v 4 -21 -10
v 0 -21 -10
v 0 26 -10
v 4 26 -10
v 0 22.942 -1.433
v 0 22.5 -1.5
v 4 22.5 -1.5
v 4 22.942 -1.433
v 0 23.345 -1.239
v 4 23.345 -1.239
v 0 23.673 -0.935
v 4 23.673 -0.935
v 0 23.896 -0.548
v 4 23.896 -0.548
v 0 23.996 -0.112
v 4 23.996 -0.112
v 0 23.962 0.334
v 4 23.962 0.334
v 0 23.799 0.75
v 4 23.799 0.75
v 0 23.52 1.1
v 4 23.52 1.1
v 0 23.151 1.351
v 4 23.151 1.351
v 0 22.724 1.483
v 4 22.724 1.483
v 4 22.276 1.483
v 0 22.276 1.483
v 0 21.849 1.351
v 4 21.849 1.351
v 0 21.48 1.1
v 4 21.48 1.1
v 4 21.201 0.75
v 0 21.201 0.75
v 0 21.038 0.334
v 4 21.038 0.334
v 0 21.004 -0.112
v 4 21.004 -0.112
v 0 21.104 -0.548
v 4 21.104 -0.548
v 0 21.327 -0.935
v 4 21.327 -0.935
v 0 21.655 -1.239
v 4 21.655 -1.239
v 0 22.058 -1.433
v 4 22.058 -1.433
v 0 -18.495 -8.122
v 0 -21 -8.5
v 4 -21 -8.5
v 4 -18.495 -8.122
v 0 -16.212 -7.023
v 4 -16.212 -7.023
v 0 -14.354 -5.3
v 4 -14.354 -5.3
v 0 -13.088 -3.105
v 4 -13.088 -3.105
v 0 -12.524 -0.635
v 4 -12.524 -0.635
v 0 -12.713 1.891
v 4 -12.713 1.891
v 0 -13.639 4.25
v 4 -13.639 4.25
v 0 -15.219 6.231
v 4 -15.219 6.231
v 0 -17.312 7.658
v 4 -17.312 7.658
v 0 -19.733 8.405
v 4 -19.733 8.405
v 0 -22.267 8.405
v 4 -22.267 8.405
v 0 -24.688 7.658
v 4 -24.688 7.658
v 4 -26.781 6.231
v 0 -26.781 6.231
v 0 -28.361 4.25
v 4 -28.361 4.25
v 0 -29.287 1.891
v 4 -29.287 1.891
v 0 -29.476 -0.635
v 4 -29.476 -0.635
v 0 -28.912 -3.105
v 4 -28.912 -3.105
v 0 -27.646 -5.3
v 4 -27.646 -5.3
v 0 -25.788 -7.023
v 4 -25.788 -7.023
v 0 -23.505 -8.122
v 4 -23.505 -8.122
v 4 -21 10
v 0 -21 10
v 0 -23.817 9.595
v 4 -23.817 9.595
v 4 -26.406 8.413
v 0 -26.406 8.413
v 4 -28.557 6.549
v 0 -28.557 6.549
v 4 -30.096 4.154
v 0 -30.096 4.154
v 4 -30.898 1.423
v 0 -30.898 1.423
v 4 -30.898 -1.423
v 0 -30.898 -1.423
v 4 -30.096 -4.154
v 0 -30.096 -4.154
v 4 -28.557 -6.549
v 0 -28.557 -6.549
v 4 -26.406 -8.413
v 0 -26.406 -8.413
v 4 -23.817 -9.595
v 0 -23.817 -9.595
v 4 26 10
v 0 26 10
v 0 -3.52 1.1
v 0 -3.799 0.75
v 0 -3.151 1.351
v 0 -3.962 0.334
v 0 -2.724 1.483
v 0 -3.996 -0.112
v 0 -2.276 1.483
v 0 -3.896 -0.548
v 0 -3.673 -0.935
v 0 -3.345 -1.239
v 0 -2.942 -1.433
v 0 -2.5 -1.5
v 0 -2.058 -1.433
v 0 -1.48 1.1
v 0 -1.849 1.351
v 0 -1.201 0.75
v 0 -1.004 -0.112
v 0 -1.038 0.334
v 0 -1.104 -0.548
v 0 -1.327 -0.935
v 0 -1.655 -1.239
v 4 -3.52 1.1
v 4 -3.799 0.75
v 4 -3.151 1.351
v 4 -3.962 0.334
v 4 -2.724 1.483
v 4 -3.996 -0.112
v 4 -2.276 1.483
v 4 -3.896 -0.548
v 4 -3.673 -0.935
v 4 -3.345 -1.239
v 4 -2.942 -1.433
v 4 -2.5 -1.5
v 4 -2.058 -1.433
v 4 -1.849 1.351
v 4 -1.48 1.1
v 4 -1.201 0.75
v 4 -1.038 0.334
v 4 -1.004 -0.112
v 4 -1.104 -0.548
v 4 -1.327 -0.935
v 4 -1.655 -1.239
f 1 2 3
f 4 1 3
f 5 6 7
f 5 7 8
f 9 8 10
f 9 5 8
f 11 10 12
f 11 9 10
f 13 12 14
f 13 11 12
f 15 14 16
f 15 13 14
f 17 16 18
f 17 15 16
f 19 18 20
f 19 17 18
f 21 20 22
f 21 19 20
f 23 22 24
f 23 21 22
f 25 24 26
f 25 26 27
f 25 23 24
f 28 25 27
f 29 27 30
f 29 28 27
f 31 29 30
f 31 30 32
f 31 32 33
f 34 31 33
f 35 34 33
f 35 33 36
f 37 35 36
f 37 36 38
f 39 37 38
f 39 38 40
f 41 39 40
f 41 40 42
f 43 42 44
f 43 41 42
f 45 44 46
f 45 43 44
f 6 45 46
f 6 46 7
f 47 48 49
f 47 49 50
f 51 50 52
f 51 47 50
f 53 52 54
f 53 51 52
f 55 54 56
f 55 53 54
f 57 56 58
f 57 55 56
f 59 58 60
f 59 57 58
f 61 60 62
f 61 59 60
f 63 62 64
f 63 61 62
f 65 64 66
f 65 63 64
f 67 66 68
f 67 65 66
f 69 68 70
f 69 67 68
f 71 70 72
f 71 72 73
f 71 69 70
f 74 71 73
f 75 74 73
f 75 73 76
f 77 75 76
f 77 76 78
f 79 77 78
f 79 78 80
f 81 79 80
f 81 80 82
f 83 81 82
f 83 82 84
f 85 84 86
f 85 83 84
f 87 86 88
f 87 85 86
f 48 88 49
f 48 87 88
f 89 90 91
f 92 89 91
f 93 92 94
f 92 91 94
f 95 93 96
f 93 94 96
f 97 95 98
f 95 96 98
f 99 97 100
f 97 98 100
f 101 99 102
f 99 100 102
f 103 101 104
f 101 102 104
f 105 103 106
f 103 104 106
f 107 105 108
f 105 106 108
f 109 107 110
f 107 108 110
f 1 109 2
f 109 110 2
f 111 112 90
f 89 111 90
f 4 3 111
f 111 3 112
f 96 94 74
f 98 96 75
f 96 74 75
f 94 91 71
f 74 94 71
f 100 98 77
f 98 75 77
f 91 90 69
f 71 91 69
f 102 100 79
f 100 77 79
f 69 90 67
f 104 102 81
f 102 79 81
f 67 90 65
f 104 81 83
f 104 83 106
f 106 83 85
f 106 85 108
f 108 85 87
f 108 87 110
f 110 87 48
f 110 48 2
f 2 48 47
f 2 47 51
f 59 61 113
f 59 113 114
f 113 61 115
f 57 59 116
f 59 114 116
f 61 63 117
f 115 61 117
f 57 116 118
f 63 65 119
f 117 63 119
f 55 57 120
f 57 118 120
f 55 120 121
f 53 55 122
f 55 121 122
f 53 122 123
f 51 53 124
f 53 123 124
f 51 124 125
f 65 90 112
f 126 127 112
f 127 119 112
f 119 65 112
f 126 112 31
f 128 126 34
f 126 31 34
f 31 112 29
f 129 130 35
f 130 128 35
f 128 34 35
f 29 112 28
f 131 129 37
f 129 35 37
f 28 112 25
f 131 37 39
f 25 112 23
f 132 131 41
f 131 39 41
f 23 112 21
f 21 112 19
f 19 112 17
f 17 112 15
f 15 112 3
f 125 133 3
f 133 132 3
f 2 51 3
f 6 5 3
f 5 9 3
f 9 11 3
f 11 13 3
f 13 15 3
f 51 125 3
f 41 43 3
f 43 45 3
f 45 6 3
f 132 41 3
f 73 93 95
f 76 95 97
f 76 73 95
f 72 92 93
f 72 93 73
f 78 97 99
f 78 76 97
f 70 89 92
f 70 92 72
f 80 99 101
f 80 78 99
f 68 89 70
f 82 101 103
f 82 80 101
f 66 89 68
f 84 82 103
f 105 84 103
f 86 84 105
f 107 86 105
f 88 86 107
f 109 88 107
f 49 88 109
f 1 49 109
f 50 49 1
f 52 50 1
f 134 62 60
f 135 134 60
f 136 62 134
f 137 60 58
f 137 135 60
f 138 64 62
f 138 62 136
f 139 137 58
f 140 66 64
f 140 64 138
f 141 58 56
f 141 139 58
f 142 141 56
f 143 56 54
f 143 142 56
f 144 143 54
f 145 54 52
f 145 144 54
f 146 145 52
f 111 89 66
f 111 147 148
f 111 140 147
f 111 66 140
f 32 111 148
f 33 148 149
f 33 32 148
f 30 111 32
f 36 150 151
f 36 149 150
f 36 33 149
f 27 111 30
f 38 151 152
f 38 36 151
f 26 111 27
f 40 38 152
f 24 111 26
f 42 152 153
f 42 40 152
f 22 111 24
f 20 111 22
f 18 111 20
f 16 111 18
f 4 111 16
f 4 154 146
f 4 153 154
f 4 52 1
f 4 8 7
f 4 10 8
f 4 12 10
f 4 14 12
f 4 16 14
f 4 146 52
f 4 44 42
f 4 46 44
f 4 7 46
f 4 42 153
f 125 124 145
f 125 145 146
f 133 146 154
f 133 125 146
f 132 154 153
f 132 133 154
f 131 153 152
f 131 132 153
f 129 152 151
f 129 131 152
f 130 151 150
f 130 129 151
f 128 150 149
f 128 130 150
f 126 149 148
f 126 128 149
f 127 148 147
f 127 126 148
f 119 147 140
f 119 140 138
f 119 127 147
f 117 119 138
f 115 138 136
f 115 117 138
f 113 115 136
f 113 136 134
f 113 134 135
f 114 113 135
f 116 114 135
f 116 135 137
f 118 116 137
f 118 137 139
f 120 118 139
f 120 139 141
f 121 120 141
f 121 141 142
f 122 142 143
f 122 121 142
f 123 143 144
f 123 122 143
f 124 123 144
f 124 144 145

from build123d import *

# Parameters (mm, degrees)
SKETCH_1_R      = 1.5
SKETCH_1_R_2    = 8.5
EXTRUDE_1_DEPTH = 4


with BuildPart() as part:
    # 草图1 → 凸台-拉伸1 (new body)
    with BuildSketch(Plane(origin=(0, 0, 0), x_dir=(0, 0, -1), z_dir=(1, 0, 0))):
        with BuildLine():
            Line((-10, 26), (-10, -21))
            ThreePointArc((-10, -21), (0, -31), (10, -21))
            Line((10, -21), (10, 26))
            Line((10, 26), (-10, 26))
        make_face()
        with Locations((0, 22.5)):
            Circle(SKETCH_1_R, mode=Mode.SUBTRACT)
        with Locations((0, -21)):
            Circle(SKETCH_1_R_2, mode=Mode.SUBTRACT)
        with Locations((0, -2.5)):
            Circle(SKETCH_1_R, mode=Mode.SUBTRACT)
    extrude(amount=EXTRUDE_1_DEPTH)


solid = part.part
